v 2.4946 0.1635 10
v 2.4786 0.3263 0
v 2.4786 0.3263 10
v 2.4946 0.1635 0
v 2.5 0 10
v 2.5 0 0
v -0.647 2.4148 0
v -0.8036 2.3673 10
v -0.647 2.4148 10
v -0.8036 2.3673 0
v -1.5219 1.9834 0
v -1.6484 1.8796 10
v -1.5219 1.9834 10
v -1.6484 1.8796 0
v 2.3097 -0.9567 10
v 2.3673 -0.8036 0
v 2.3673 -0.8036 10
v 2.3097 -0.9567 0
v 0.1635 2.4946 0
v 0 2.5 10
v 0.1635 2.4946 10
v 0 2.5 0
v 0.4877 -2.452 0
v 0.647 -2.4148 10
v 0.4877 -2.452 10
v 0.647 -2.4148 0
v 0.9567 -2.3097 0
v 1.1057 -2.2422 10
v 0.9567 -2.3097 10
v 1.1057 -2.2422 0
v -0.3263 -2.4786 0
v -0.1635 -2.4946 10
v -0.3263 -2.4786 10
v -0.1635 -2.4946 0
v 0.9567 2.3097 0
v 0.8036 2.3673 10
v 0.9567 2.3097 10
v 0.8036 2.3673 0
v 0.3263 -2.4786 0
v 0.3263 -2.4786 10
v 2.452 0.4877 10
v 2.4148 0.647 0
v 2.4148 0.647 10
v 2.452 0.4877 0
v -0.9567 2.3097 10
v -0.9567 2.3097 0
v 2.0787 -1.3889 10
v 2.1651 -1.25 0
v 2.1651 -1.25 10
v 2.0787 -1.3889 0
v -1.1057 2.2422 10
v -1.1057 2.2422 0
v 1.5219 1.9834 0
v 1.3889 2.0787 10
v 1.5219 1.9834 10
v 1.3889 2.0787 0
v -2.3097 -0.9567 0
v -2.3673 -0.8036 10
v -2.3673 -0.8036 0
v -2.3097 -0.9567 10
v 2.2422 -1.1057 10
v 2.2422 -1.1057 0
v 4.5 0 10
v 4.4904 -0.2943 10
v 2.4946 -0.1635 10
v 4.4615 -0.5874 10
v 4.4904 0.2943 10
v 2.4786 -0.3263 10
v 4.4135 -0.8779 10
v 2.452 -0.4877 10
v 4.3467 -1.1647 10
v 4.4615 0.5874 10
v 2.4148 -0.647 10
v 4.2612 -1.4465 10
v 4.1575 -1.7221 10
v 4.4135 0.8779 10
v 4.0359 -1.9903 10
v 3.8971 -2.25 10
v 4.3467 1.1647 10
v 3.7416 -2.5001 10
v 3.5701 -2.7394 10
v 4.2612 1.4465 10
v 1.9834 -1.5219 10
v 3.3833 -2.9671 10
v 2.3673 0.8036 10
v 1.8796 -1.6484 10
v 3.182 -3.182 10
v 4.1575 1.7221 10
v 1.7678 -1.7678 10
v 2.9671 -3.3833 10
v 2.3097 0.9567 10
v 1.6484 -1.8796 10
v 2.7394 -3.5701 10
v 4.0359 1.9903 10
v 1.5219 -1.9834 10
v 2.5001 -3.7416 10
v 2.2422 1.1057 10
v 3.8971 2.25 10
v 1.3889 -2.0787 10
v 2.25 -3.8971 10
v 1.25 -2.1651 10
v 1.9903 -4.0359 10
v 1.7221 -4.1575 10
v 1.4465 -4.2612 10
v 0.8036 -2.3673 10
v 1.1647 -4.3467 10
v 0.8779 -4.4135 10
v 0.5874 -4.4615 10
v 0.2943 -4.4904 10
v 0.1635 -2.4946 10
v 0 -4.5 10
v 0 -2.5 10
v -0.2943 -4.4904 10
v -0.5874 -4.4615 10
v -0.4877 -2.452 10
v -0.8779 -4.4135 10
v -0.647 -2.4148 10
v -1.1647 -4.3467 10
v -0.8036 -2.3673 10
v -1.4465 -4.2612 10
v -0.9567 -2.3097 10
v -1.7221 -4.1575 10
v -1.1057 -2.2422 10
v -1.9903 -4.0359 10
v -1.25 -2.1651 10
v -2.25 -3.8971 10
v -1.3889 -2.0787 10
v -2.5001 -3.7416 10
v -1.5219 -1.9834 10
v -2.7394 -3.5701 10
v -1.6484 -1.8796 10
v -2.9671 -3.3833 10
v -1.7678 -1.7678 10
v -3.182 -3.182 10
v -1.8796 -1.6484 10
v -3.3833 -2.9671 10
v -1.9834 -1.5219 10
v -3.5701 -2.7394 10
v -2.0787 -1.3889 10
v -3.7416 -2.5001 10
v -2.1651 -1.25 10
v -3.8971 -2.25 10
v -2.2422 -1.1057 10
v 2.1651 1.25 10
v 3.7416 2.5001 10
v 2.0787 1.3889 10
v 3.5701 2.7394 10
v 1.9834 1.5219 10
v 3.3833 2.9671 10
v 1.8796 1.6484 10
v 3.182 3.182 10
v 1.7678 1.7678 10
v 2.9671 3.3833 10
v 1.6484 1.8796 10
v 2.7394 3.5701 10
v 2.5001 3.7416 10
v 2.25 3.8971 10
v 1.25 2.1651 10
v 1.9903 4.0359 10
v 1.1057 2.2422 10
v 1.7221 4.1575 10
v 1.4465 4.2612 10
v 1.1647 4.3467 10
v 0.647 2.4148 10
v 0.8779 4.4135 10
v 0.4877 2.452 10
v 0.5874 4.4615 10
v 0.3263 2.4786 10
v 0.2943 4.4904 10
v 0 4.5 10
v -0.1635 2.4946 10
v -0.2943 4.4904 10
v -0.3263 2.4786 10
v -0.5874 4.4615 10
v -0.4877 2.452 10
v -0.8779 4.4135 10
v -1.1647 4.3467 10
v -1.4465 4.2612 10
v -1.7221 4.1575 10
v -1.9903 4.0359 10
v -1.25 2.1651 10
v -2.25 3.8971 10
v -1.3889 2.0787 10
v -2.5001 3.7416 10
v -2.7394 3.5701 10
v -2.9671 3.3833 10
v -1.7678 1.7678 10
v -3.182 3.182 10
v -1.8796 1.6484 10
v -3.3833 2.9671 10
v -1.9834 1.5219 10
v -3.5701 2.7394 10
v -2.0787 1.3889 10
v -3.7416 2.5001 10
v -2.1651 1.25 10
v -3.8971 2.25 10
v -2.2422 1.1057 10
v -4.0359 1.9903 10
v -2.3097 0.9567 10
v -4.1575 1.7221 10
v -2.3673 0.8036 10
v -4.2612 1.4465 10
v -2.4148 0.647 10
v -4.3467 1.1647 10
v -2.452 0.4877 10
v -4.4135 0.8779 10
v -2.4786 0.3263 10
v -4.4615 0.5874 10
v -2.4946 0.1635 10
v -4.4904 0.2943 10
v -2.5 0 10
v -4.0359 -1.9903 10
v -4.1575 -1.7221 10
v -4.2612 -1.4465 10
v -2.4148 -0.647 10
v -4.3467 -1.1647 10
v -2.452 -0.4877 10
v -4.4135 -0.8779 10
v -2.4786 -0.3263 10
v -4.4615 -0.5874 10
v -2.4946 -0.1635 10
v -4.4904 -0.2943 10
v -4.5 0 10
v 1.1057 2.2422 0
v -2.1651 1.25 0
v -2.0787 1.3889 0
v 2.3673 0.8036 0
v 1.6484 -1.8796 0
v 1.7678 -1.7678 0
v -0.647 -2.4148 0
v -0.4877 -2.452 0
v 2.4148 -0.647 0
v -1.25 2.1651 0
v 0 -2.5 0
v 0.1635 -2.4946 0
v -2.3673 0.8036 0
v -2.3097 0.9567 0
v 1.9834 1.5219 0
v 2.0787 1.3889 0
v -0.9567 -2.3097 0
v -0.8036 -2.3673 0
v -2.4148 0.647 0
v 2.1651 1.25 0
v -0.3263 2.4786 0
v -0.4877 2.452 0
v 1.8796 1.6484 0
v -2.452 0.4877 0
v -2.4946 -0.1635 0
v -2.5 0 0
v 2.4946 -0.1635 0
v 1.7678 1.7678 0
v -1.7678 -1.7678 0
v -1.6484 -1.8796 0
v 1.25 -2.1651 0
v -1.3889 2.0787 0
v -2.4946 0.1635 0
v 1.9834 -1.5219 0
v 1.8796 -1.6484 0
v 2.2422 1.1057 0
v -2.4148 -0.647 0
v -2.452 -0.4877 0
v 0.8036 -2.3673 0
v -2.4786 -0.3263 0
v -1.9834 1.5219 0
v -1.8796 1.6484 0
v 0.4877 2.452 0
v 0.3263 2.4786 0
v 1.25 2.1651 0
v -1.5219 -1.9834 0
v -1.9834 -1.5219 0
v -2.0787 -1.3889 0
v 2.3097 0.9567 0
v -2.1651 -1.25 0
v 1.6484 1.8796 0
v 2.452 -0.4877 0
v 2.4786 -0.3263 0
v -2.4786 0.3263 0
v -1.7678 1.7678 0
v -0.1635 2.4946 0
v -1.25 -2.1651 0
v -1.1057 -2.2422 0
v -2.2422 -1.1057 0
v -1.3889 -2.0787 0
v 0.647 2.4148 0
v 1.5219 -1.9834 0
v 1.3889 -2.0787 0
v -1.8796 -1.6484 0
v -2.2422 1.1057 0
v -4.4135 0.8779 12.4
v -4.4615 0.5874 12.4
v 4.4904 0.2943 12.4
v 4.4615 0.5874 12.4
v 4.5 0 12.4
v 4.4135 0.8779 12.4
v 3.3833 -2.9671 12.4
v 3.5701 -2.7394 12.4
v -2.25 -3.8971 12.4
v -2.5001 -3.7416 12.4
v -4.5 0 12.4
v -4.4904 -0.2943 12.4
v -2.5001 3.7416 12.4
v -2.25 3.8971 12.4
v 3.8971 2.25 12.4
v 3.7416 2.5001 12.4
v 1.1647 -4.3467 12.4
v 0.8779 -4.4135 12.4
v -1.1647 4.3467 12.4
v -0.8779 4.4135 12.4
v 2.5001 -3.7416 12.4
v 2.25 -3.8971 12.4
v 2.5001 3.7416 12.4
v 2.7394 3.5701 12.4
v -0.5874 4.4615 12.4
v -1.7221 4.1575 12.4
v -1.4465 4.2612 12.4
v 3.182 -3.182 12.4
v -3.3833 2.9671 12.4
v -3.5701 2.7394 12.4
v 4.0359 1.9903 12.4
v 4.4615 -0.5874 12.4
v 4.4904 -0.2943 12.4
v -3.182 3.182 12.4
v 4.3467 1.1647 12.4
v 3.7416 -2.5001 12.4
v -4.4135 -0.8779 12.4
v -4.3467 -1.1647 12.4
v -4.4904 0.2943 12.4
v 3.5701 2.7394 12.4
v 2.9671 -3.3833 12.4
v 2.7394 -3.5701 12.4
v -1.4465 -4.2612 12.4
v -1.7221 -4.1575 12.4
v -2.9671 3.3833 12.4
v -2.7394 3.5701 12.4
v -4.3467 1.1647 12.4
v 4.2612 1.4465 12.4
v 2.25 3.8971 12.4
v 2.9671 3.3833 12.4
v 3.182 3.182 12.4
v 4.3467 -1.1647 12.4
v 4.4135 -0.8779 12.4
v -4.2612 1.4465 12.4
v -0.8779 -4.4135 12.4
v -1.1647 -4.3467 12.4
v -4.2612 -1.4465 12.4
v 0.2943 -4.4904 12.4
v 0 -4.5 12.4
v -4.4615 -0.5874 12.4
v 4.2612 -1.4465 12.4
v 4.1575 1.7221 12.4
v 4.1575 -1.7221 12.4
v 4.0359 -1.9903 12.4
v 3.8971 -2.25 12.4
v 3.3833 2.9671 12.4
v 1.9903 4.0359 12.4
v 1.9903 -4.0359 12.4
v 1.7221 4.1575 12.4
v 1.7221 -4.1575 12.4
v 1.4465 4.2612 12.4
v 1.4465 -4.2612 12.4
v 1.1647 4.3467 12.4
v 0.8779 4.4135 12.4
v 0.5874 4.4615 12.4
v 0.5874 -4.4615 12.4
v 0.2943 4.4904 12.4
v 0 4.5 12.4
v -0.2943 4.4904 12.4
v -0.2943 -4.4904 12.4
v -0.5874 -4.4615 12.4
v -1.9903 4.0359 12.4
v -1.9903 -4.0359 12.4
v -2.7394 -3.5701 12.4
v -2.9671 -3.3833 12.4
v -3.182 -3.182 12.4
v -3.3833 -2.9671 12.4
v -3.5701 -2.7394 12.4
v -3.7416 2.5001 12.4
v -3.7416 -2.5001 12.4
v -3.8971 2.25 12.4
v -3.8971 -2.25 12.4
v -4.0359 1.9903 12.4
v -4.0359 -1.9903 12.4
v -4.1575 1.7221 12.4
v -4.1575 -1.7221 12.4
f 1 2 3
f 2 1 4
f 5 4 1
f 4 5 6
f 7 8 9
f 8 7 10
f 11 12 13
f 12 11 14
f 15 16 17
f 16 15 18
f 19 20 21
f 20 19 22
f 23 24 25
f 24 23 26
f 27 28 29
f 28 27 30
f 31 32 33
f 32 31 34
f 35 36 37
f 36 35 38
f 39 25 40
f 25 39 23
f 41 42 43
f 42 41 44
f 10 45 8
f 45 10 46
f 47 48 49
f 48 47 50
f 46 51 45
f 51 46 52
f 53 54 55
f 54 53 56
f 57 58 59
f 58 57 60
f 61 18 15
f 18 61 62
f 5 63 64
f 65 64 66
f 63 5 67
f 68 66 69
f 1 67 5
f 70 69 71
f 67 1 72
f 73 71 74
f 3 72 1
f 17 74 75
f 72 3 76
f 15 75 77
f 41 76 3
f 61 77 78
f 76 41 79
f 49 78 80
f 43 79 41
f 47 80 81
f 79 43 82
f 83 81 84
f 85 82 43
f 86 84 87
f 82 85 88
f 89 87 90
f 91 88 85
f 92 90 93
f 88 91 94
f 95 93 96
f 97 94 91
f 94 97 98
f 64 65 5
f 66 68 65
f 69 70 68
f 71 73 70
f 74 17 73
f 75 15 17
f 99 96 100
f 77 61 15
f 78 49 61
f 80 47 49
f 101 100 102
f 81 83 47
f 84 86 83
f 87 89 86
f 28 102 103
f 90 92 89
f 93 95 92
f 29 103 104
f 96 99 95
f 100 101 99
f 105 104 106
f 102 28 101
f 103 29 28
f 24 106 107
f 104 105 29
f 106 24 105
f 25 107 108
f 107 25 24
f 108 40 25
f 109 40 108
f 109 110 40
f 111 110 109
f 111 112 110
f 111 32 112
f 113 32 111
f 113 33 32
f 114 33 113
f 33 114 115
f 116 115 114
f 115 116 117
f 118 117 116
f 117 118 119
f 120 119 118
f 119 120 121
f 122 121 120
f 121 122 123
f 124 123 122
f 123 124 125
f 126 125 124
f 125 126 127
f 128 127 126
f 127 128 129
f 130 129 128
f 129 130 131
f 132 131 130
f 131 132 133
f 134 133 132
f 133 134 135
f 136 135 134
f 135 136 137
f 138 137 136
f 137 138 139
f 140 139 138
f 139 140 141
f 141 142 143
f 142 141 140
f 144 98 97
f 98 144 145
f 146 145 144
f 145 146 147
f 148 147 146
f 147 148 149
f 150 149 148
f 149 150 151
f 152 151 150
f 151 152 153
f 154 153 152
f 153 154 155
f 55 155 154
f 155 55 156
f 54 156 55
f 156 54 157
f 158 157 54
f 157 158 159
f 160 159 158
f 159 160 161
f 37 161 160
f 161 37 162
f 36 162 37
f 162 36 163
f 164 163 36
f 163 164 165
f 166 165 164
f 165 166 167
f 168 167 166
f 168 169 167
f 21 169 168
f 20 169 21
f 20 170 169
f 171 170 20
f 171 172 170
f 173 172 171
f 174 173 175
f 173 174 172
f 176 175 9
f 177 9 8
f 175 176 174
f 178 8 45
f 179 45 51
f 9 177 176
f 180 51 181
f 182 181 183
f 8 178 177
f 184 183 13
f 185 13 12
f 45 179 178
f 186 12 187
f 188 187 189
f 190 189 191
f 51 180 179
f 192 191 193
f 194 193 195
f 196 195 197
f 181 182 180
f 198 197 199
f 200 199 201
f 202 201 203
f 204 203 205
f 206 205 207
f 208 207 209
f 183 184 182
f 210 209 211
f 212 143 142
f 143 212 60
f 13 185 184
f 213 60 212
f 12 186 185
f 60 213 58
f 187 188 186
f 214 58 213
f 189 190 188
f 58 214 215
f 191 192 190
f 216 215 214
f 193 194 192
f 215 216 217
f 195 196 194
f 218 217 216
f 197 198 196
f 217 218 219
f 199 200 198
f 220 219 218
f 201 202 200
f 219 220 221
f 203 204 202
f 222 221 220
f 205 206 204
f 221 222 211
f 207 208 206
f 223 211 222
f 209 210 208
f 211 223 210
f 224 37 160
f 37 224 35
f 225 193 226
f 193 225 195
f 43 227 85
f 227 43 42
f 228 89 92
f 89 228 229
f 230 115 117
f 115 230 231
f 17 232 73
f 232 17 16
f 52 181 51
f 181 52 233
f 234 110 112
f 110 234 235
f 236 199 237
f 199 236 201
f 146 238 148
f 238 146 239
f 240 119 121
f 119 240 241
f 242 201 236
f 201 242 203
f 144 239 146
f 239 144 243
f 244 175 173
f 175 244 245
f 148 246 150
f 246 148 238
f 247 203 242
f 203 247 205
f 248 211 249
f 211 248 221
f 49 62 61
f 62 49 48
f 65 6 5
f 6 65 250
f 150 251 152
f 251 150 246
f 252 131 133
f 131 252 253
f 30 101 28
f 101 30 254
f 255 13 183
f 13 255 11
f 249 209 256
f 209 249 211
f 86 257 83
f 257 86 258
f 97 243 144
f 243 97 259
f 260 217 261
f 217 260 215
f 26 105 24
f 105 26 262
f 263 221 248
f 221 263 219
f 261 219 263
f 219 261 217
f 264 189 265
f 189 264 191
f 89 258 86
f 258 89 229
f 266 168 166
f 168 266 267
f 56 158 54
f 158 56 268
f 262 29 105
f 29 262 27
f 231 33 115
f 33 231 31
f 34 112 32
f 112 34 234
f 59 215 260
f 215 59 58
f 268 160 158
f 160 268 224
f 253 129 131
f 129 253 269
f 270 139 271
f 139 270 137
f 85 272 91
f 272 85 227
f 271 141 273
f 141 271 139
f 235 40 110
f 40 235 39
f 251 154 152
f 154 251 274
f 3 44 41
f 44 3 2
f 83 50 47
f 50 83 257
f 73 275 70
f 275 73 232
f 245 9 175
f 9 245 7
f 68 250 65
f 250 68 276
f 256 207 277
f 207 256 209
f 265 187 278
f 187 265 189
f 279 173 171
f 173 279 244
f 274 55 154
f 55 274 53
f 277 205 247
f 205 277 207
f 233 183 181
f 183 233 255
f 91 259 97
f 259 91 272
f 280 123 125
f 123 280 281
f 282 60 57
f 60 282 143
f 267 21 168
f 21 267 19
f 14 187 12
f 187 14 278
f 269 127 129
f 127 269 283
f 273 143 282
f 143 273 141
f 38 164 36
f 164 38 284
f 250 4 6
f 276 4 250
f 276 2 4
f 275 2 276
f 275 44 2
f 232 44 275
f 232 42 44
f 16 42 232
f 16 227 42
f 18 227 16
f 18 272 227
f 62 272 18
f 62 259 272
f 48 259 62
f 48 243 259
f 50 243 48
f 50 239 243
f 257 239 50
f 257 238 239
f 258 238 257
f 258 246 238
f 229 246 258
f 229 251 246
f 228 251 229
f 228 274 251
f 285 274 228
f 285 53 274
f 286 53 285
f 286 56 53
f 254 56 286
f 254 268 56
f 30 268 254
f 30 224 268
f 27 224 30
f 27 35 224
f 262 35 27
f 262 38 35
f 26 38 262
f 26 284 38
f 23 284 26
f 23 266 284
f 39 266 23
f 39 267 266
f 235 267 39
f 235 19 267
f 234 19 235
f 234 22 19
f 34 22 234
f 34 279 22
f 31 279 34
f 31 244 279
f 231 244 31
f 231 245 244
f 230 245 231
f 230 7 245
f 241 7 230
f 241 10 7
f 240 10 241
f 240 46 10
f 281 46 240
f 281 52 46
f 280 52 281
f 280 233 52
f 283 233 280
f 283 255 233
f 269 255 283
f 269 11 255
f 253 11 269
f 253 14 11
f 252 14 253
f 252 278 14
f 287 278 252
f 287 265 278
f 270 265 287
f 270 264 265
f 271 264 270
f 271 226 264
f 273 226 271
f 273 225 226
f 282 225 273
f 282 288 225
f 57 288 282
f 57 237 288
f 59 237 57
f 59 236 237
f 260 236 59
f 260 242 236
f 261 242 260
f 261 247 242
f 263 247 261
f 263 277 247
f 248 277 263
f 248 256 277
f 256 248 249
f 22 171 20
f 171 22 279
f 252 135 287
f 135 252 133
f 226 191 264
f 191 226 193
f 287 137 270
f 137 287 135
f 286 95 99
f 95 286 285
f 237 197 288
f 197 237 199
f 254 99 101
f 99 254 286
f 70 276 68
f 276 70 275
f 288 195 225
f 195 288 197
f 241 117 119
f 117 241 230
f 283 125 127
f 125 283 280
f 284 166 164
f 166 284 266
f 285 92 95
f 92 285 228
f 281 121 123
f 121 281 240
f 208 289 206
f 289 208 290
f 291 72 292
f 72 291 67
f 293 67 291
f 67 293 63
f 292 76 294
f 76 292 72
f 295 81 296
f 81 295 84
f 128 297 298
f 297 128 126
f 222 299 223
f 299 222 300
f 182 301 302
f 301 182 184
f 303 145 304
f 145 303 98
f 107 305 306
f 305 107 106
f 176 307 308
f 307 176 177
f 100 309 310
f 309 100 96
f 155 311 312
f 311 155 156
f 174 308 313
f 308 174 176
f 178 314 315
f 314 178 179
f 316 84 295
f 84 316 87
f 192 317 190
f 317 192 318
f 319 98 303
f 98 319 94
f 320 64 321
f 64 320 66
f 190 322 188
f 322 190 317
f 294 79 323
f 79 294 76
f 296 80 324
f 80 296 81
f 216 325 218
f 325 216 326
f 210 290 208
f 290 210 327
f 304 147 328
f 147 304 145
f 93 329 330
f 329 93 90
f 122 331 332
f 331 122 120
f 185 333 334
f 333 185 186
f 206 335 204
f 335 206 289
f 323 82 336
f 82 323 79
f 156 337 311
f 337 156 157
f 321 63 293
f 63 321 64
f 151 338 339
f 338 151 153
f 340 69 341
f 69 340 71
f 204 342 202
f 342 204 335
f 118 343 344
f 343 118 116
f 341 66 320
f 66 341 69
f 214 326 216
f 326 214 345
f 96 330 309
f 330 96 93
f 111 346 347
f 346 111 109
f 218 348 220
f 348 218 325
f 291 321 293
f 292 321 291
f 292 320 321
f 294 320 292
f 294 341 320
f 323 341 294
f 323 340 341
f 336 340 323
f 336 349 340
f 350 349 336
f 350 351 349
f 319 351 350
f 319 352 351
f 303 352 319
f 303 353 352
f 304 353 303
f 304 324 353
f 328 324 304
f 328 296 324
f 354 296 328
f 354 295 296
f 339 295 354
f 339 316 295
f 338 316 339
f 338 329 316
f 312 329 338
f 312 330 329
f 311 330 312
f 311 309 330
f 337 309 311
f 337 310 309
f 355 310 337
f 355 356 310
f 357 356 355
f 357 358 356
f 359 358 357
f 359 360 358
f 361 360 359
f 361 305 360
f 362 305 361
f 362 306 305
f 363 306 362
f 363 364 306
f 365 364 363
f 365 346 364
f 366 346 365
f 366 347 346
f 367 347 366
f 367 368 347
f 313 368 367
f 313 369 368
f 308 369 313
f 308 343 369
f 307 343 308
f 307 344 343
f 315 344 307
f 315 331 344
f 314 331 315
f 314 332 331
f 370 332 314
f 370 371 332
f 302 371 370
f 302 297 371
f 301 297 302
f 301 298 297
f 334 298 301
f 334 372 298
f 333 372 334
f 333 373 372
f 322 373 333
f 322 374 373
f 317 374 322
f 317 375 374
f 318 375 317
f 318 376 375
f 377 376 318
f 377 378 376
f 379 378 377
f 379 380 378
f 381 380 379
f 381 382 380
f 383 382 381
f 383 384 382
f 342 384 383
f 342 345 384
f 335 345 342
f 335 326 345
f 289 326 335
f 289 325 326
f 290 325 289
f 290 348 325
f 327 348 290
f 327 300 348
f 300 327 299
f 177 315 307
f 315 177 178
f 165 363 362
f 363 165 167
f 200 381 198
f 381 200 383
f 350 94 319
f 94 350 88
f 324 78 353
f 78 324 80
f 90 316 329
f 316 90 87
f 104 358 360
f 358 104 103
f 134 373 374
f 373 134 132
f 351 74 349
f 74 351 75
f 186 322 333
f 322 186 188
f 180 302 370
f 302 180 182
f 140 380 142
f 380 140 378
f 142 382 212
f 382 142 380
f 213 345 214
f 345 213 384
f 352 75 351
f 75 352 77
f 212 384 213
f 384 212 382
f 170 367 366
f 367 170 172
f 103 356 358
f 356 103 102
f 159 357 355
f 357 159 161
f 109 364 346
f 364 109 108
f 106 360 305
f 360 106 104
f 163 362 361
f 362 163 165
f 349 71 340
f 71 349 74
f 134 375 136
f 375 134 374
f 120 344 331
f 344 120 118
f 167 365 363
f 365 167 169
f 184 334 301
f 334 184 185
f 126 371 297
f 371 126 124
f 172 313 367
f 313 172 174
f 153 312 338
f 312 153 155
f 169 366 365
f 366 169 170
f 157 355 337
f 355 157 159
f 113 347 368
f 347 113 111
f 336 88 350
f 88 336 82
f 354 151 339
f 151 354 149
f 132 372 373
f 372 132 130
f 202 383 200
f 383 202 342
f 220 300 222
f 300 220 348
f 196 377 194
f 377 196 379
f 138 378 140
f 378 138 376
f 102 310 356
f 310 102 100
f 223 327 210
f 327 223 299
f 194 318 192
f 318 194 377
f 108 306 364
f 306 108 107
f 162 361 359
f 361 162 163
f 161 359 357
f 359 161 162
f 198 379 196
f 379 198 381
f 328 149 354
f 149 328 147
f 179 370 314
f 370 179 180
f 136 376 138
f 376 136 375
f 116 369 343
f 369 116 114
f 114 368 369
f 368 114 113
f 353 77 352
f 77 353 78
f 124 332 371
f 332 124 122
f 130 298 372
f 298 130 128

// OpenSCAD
$fn = 96;

shaft_d = 5.0;
head_d  = 9.0;
head_h  = 2.4;
len     = 10.0;

union() {
  // Shaft
  cylinder(h = len, d = shaft_d);

  // Head on top
  translate([0,0,len])
    cylinder(h = head_h, d = head_d);
}
